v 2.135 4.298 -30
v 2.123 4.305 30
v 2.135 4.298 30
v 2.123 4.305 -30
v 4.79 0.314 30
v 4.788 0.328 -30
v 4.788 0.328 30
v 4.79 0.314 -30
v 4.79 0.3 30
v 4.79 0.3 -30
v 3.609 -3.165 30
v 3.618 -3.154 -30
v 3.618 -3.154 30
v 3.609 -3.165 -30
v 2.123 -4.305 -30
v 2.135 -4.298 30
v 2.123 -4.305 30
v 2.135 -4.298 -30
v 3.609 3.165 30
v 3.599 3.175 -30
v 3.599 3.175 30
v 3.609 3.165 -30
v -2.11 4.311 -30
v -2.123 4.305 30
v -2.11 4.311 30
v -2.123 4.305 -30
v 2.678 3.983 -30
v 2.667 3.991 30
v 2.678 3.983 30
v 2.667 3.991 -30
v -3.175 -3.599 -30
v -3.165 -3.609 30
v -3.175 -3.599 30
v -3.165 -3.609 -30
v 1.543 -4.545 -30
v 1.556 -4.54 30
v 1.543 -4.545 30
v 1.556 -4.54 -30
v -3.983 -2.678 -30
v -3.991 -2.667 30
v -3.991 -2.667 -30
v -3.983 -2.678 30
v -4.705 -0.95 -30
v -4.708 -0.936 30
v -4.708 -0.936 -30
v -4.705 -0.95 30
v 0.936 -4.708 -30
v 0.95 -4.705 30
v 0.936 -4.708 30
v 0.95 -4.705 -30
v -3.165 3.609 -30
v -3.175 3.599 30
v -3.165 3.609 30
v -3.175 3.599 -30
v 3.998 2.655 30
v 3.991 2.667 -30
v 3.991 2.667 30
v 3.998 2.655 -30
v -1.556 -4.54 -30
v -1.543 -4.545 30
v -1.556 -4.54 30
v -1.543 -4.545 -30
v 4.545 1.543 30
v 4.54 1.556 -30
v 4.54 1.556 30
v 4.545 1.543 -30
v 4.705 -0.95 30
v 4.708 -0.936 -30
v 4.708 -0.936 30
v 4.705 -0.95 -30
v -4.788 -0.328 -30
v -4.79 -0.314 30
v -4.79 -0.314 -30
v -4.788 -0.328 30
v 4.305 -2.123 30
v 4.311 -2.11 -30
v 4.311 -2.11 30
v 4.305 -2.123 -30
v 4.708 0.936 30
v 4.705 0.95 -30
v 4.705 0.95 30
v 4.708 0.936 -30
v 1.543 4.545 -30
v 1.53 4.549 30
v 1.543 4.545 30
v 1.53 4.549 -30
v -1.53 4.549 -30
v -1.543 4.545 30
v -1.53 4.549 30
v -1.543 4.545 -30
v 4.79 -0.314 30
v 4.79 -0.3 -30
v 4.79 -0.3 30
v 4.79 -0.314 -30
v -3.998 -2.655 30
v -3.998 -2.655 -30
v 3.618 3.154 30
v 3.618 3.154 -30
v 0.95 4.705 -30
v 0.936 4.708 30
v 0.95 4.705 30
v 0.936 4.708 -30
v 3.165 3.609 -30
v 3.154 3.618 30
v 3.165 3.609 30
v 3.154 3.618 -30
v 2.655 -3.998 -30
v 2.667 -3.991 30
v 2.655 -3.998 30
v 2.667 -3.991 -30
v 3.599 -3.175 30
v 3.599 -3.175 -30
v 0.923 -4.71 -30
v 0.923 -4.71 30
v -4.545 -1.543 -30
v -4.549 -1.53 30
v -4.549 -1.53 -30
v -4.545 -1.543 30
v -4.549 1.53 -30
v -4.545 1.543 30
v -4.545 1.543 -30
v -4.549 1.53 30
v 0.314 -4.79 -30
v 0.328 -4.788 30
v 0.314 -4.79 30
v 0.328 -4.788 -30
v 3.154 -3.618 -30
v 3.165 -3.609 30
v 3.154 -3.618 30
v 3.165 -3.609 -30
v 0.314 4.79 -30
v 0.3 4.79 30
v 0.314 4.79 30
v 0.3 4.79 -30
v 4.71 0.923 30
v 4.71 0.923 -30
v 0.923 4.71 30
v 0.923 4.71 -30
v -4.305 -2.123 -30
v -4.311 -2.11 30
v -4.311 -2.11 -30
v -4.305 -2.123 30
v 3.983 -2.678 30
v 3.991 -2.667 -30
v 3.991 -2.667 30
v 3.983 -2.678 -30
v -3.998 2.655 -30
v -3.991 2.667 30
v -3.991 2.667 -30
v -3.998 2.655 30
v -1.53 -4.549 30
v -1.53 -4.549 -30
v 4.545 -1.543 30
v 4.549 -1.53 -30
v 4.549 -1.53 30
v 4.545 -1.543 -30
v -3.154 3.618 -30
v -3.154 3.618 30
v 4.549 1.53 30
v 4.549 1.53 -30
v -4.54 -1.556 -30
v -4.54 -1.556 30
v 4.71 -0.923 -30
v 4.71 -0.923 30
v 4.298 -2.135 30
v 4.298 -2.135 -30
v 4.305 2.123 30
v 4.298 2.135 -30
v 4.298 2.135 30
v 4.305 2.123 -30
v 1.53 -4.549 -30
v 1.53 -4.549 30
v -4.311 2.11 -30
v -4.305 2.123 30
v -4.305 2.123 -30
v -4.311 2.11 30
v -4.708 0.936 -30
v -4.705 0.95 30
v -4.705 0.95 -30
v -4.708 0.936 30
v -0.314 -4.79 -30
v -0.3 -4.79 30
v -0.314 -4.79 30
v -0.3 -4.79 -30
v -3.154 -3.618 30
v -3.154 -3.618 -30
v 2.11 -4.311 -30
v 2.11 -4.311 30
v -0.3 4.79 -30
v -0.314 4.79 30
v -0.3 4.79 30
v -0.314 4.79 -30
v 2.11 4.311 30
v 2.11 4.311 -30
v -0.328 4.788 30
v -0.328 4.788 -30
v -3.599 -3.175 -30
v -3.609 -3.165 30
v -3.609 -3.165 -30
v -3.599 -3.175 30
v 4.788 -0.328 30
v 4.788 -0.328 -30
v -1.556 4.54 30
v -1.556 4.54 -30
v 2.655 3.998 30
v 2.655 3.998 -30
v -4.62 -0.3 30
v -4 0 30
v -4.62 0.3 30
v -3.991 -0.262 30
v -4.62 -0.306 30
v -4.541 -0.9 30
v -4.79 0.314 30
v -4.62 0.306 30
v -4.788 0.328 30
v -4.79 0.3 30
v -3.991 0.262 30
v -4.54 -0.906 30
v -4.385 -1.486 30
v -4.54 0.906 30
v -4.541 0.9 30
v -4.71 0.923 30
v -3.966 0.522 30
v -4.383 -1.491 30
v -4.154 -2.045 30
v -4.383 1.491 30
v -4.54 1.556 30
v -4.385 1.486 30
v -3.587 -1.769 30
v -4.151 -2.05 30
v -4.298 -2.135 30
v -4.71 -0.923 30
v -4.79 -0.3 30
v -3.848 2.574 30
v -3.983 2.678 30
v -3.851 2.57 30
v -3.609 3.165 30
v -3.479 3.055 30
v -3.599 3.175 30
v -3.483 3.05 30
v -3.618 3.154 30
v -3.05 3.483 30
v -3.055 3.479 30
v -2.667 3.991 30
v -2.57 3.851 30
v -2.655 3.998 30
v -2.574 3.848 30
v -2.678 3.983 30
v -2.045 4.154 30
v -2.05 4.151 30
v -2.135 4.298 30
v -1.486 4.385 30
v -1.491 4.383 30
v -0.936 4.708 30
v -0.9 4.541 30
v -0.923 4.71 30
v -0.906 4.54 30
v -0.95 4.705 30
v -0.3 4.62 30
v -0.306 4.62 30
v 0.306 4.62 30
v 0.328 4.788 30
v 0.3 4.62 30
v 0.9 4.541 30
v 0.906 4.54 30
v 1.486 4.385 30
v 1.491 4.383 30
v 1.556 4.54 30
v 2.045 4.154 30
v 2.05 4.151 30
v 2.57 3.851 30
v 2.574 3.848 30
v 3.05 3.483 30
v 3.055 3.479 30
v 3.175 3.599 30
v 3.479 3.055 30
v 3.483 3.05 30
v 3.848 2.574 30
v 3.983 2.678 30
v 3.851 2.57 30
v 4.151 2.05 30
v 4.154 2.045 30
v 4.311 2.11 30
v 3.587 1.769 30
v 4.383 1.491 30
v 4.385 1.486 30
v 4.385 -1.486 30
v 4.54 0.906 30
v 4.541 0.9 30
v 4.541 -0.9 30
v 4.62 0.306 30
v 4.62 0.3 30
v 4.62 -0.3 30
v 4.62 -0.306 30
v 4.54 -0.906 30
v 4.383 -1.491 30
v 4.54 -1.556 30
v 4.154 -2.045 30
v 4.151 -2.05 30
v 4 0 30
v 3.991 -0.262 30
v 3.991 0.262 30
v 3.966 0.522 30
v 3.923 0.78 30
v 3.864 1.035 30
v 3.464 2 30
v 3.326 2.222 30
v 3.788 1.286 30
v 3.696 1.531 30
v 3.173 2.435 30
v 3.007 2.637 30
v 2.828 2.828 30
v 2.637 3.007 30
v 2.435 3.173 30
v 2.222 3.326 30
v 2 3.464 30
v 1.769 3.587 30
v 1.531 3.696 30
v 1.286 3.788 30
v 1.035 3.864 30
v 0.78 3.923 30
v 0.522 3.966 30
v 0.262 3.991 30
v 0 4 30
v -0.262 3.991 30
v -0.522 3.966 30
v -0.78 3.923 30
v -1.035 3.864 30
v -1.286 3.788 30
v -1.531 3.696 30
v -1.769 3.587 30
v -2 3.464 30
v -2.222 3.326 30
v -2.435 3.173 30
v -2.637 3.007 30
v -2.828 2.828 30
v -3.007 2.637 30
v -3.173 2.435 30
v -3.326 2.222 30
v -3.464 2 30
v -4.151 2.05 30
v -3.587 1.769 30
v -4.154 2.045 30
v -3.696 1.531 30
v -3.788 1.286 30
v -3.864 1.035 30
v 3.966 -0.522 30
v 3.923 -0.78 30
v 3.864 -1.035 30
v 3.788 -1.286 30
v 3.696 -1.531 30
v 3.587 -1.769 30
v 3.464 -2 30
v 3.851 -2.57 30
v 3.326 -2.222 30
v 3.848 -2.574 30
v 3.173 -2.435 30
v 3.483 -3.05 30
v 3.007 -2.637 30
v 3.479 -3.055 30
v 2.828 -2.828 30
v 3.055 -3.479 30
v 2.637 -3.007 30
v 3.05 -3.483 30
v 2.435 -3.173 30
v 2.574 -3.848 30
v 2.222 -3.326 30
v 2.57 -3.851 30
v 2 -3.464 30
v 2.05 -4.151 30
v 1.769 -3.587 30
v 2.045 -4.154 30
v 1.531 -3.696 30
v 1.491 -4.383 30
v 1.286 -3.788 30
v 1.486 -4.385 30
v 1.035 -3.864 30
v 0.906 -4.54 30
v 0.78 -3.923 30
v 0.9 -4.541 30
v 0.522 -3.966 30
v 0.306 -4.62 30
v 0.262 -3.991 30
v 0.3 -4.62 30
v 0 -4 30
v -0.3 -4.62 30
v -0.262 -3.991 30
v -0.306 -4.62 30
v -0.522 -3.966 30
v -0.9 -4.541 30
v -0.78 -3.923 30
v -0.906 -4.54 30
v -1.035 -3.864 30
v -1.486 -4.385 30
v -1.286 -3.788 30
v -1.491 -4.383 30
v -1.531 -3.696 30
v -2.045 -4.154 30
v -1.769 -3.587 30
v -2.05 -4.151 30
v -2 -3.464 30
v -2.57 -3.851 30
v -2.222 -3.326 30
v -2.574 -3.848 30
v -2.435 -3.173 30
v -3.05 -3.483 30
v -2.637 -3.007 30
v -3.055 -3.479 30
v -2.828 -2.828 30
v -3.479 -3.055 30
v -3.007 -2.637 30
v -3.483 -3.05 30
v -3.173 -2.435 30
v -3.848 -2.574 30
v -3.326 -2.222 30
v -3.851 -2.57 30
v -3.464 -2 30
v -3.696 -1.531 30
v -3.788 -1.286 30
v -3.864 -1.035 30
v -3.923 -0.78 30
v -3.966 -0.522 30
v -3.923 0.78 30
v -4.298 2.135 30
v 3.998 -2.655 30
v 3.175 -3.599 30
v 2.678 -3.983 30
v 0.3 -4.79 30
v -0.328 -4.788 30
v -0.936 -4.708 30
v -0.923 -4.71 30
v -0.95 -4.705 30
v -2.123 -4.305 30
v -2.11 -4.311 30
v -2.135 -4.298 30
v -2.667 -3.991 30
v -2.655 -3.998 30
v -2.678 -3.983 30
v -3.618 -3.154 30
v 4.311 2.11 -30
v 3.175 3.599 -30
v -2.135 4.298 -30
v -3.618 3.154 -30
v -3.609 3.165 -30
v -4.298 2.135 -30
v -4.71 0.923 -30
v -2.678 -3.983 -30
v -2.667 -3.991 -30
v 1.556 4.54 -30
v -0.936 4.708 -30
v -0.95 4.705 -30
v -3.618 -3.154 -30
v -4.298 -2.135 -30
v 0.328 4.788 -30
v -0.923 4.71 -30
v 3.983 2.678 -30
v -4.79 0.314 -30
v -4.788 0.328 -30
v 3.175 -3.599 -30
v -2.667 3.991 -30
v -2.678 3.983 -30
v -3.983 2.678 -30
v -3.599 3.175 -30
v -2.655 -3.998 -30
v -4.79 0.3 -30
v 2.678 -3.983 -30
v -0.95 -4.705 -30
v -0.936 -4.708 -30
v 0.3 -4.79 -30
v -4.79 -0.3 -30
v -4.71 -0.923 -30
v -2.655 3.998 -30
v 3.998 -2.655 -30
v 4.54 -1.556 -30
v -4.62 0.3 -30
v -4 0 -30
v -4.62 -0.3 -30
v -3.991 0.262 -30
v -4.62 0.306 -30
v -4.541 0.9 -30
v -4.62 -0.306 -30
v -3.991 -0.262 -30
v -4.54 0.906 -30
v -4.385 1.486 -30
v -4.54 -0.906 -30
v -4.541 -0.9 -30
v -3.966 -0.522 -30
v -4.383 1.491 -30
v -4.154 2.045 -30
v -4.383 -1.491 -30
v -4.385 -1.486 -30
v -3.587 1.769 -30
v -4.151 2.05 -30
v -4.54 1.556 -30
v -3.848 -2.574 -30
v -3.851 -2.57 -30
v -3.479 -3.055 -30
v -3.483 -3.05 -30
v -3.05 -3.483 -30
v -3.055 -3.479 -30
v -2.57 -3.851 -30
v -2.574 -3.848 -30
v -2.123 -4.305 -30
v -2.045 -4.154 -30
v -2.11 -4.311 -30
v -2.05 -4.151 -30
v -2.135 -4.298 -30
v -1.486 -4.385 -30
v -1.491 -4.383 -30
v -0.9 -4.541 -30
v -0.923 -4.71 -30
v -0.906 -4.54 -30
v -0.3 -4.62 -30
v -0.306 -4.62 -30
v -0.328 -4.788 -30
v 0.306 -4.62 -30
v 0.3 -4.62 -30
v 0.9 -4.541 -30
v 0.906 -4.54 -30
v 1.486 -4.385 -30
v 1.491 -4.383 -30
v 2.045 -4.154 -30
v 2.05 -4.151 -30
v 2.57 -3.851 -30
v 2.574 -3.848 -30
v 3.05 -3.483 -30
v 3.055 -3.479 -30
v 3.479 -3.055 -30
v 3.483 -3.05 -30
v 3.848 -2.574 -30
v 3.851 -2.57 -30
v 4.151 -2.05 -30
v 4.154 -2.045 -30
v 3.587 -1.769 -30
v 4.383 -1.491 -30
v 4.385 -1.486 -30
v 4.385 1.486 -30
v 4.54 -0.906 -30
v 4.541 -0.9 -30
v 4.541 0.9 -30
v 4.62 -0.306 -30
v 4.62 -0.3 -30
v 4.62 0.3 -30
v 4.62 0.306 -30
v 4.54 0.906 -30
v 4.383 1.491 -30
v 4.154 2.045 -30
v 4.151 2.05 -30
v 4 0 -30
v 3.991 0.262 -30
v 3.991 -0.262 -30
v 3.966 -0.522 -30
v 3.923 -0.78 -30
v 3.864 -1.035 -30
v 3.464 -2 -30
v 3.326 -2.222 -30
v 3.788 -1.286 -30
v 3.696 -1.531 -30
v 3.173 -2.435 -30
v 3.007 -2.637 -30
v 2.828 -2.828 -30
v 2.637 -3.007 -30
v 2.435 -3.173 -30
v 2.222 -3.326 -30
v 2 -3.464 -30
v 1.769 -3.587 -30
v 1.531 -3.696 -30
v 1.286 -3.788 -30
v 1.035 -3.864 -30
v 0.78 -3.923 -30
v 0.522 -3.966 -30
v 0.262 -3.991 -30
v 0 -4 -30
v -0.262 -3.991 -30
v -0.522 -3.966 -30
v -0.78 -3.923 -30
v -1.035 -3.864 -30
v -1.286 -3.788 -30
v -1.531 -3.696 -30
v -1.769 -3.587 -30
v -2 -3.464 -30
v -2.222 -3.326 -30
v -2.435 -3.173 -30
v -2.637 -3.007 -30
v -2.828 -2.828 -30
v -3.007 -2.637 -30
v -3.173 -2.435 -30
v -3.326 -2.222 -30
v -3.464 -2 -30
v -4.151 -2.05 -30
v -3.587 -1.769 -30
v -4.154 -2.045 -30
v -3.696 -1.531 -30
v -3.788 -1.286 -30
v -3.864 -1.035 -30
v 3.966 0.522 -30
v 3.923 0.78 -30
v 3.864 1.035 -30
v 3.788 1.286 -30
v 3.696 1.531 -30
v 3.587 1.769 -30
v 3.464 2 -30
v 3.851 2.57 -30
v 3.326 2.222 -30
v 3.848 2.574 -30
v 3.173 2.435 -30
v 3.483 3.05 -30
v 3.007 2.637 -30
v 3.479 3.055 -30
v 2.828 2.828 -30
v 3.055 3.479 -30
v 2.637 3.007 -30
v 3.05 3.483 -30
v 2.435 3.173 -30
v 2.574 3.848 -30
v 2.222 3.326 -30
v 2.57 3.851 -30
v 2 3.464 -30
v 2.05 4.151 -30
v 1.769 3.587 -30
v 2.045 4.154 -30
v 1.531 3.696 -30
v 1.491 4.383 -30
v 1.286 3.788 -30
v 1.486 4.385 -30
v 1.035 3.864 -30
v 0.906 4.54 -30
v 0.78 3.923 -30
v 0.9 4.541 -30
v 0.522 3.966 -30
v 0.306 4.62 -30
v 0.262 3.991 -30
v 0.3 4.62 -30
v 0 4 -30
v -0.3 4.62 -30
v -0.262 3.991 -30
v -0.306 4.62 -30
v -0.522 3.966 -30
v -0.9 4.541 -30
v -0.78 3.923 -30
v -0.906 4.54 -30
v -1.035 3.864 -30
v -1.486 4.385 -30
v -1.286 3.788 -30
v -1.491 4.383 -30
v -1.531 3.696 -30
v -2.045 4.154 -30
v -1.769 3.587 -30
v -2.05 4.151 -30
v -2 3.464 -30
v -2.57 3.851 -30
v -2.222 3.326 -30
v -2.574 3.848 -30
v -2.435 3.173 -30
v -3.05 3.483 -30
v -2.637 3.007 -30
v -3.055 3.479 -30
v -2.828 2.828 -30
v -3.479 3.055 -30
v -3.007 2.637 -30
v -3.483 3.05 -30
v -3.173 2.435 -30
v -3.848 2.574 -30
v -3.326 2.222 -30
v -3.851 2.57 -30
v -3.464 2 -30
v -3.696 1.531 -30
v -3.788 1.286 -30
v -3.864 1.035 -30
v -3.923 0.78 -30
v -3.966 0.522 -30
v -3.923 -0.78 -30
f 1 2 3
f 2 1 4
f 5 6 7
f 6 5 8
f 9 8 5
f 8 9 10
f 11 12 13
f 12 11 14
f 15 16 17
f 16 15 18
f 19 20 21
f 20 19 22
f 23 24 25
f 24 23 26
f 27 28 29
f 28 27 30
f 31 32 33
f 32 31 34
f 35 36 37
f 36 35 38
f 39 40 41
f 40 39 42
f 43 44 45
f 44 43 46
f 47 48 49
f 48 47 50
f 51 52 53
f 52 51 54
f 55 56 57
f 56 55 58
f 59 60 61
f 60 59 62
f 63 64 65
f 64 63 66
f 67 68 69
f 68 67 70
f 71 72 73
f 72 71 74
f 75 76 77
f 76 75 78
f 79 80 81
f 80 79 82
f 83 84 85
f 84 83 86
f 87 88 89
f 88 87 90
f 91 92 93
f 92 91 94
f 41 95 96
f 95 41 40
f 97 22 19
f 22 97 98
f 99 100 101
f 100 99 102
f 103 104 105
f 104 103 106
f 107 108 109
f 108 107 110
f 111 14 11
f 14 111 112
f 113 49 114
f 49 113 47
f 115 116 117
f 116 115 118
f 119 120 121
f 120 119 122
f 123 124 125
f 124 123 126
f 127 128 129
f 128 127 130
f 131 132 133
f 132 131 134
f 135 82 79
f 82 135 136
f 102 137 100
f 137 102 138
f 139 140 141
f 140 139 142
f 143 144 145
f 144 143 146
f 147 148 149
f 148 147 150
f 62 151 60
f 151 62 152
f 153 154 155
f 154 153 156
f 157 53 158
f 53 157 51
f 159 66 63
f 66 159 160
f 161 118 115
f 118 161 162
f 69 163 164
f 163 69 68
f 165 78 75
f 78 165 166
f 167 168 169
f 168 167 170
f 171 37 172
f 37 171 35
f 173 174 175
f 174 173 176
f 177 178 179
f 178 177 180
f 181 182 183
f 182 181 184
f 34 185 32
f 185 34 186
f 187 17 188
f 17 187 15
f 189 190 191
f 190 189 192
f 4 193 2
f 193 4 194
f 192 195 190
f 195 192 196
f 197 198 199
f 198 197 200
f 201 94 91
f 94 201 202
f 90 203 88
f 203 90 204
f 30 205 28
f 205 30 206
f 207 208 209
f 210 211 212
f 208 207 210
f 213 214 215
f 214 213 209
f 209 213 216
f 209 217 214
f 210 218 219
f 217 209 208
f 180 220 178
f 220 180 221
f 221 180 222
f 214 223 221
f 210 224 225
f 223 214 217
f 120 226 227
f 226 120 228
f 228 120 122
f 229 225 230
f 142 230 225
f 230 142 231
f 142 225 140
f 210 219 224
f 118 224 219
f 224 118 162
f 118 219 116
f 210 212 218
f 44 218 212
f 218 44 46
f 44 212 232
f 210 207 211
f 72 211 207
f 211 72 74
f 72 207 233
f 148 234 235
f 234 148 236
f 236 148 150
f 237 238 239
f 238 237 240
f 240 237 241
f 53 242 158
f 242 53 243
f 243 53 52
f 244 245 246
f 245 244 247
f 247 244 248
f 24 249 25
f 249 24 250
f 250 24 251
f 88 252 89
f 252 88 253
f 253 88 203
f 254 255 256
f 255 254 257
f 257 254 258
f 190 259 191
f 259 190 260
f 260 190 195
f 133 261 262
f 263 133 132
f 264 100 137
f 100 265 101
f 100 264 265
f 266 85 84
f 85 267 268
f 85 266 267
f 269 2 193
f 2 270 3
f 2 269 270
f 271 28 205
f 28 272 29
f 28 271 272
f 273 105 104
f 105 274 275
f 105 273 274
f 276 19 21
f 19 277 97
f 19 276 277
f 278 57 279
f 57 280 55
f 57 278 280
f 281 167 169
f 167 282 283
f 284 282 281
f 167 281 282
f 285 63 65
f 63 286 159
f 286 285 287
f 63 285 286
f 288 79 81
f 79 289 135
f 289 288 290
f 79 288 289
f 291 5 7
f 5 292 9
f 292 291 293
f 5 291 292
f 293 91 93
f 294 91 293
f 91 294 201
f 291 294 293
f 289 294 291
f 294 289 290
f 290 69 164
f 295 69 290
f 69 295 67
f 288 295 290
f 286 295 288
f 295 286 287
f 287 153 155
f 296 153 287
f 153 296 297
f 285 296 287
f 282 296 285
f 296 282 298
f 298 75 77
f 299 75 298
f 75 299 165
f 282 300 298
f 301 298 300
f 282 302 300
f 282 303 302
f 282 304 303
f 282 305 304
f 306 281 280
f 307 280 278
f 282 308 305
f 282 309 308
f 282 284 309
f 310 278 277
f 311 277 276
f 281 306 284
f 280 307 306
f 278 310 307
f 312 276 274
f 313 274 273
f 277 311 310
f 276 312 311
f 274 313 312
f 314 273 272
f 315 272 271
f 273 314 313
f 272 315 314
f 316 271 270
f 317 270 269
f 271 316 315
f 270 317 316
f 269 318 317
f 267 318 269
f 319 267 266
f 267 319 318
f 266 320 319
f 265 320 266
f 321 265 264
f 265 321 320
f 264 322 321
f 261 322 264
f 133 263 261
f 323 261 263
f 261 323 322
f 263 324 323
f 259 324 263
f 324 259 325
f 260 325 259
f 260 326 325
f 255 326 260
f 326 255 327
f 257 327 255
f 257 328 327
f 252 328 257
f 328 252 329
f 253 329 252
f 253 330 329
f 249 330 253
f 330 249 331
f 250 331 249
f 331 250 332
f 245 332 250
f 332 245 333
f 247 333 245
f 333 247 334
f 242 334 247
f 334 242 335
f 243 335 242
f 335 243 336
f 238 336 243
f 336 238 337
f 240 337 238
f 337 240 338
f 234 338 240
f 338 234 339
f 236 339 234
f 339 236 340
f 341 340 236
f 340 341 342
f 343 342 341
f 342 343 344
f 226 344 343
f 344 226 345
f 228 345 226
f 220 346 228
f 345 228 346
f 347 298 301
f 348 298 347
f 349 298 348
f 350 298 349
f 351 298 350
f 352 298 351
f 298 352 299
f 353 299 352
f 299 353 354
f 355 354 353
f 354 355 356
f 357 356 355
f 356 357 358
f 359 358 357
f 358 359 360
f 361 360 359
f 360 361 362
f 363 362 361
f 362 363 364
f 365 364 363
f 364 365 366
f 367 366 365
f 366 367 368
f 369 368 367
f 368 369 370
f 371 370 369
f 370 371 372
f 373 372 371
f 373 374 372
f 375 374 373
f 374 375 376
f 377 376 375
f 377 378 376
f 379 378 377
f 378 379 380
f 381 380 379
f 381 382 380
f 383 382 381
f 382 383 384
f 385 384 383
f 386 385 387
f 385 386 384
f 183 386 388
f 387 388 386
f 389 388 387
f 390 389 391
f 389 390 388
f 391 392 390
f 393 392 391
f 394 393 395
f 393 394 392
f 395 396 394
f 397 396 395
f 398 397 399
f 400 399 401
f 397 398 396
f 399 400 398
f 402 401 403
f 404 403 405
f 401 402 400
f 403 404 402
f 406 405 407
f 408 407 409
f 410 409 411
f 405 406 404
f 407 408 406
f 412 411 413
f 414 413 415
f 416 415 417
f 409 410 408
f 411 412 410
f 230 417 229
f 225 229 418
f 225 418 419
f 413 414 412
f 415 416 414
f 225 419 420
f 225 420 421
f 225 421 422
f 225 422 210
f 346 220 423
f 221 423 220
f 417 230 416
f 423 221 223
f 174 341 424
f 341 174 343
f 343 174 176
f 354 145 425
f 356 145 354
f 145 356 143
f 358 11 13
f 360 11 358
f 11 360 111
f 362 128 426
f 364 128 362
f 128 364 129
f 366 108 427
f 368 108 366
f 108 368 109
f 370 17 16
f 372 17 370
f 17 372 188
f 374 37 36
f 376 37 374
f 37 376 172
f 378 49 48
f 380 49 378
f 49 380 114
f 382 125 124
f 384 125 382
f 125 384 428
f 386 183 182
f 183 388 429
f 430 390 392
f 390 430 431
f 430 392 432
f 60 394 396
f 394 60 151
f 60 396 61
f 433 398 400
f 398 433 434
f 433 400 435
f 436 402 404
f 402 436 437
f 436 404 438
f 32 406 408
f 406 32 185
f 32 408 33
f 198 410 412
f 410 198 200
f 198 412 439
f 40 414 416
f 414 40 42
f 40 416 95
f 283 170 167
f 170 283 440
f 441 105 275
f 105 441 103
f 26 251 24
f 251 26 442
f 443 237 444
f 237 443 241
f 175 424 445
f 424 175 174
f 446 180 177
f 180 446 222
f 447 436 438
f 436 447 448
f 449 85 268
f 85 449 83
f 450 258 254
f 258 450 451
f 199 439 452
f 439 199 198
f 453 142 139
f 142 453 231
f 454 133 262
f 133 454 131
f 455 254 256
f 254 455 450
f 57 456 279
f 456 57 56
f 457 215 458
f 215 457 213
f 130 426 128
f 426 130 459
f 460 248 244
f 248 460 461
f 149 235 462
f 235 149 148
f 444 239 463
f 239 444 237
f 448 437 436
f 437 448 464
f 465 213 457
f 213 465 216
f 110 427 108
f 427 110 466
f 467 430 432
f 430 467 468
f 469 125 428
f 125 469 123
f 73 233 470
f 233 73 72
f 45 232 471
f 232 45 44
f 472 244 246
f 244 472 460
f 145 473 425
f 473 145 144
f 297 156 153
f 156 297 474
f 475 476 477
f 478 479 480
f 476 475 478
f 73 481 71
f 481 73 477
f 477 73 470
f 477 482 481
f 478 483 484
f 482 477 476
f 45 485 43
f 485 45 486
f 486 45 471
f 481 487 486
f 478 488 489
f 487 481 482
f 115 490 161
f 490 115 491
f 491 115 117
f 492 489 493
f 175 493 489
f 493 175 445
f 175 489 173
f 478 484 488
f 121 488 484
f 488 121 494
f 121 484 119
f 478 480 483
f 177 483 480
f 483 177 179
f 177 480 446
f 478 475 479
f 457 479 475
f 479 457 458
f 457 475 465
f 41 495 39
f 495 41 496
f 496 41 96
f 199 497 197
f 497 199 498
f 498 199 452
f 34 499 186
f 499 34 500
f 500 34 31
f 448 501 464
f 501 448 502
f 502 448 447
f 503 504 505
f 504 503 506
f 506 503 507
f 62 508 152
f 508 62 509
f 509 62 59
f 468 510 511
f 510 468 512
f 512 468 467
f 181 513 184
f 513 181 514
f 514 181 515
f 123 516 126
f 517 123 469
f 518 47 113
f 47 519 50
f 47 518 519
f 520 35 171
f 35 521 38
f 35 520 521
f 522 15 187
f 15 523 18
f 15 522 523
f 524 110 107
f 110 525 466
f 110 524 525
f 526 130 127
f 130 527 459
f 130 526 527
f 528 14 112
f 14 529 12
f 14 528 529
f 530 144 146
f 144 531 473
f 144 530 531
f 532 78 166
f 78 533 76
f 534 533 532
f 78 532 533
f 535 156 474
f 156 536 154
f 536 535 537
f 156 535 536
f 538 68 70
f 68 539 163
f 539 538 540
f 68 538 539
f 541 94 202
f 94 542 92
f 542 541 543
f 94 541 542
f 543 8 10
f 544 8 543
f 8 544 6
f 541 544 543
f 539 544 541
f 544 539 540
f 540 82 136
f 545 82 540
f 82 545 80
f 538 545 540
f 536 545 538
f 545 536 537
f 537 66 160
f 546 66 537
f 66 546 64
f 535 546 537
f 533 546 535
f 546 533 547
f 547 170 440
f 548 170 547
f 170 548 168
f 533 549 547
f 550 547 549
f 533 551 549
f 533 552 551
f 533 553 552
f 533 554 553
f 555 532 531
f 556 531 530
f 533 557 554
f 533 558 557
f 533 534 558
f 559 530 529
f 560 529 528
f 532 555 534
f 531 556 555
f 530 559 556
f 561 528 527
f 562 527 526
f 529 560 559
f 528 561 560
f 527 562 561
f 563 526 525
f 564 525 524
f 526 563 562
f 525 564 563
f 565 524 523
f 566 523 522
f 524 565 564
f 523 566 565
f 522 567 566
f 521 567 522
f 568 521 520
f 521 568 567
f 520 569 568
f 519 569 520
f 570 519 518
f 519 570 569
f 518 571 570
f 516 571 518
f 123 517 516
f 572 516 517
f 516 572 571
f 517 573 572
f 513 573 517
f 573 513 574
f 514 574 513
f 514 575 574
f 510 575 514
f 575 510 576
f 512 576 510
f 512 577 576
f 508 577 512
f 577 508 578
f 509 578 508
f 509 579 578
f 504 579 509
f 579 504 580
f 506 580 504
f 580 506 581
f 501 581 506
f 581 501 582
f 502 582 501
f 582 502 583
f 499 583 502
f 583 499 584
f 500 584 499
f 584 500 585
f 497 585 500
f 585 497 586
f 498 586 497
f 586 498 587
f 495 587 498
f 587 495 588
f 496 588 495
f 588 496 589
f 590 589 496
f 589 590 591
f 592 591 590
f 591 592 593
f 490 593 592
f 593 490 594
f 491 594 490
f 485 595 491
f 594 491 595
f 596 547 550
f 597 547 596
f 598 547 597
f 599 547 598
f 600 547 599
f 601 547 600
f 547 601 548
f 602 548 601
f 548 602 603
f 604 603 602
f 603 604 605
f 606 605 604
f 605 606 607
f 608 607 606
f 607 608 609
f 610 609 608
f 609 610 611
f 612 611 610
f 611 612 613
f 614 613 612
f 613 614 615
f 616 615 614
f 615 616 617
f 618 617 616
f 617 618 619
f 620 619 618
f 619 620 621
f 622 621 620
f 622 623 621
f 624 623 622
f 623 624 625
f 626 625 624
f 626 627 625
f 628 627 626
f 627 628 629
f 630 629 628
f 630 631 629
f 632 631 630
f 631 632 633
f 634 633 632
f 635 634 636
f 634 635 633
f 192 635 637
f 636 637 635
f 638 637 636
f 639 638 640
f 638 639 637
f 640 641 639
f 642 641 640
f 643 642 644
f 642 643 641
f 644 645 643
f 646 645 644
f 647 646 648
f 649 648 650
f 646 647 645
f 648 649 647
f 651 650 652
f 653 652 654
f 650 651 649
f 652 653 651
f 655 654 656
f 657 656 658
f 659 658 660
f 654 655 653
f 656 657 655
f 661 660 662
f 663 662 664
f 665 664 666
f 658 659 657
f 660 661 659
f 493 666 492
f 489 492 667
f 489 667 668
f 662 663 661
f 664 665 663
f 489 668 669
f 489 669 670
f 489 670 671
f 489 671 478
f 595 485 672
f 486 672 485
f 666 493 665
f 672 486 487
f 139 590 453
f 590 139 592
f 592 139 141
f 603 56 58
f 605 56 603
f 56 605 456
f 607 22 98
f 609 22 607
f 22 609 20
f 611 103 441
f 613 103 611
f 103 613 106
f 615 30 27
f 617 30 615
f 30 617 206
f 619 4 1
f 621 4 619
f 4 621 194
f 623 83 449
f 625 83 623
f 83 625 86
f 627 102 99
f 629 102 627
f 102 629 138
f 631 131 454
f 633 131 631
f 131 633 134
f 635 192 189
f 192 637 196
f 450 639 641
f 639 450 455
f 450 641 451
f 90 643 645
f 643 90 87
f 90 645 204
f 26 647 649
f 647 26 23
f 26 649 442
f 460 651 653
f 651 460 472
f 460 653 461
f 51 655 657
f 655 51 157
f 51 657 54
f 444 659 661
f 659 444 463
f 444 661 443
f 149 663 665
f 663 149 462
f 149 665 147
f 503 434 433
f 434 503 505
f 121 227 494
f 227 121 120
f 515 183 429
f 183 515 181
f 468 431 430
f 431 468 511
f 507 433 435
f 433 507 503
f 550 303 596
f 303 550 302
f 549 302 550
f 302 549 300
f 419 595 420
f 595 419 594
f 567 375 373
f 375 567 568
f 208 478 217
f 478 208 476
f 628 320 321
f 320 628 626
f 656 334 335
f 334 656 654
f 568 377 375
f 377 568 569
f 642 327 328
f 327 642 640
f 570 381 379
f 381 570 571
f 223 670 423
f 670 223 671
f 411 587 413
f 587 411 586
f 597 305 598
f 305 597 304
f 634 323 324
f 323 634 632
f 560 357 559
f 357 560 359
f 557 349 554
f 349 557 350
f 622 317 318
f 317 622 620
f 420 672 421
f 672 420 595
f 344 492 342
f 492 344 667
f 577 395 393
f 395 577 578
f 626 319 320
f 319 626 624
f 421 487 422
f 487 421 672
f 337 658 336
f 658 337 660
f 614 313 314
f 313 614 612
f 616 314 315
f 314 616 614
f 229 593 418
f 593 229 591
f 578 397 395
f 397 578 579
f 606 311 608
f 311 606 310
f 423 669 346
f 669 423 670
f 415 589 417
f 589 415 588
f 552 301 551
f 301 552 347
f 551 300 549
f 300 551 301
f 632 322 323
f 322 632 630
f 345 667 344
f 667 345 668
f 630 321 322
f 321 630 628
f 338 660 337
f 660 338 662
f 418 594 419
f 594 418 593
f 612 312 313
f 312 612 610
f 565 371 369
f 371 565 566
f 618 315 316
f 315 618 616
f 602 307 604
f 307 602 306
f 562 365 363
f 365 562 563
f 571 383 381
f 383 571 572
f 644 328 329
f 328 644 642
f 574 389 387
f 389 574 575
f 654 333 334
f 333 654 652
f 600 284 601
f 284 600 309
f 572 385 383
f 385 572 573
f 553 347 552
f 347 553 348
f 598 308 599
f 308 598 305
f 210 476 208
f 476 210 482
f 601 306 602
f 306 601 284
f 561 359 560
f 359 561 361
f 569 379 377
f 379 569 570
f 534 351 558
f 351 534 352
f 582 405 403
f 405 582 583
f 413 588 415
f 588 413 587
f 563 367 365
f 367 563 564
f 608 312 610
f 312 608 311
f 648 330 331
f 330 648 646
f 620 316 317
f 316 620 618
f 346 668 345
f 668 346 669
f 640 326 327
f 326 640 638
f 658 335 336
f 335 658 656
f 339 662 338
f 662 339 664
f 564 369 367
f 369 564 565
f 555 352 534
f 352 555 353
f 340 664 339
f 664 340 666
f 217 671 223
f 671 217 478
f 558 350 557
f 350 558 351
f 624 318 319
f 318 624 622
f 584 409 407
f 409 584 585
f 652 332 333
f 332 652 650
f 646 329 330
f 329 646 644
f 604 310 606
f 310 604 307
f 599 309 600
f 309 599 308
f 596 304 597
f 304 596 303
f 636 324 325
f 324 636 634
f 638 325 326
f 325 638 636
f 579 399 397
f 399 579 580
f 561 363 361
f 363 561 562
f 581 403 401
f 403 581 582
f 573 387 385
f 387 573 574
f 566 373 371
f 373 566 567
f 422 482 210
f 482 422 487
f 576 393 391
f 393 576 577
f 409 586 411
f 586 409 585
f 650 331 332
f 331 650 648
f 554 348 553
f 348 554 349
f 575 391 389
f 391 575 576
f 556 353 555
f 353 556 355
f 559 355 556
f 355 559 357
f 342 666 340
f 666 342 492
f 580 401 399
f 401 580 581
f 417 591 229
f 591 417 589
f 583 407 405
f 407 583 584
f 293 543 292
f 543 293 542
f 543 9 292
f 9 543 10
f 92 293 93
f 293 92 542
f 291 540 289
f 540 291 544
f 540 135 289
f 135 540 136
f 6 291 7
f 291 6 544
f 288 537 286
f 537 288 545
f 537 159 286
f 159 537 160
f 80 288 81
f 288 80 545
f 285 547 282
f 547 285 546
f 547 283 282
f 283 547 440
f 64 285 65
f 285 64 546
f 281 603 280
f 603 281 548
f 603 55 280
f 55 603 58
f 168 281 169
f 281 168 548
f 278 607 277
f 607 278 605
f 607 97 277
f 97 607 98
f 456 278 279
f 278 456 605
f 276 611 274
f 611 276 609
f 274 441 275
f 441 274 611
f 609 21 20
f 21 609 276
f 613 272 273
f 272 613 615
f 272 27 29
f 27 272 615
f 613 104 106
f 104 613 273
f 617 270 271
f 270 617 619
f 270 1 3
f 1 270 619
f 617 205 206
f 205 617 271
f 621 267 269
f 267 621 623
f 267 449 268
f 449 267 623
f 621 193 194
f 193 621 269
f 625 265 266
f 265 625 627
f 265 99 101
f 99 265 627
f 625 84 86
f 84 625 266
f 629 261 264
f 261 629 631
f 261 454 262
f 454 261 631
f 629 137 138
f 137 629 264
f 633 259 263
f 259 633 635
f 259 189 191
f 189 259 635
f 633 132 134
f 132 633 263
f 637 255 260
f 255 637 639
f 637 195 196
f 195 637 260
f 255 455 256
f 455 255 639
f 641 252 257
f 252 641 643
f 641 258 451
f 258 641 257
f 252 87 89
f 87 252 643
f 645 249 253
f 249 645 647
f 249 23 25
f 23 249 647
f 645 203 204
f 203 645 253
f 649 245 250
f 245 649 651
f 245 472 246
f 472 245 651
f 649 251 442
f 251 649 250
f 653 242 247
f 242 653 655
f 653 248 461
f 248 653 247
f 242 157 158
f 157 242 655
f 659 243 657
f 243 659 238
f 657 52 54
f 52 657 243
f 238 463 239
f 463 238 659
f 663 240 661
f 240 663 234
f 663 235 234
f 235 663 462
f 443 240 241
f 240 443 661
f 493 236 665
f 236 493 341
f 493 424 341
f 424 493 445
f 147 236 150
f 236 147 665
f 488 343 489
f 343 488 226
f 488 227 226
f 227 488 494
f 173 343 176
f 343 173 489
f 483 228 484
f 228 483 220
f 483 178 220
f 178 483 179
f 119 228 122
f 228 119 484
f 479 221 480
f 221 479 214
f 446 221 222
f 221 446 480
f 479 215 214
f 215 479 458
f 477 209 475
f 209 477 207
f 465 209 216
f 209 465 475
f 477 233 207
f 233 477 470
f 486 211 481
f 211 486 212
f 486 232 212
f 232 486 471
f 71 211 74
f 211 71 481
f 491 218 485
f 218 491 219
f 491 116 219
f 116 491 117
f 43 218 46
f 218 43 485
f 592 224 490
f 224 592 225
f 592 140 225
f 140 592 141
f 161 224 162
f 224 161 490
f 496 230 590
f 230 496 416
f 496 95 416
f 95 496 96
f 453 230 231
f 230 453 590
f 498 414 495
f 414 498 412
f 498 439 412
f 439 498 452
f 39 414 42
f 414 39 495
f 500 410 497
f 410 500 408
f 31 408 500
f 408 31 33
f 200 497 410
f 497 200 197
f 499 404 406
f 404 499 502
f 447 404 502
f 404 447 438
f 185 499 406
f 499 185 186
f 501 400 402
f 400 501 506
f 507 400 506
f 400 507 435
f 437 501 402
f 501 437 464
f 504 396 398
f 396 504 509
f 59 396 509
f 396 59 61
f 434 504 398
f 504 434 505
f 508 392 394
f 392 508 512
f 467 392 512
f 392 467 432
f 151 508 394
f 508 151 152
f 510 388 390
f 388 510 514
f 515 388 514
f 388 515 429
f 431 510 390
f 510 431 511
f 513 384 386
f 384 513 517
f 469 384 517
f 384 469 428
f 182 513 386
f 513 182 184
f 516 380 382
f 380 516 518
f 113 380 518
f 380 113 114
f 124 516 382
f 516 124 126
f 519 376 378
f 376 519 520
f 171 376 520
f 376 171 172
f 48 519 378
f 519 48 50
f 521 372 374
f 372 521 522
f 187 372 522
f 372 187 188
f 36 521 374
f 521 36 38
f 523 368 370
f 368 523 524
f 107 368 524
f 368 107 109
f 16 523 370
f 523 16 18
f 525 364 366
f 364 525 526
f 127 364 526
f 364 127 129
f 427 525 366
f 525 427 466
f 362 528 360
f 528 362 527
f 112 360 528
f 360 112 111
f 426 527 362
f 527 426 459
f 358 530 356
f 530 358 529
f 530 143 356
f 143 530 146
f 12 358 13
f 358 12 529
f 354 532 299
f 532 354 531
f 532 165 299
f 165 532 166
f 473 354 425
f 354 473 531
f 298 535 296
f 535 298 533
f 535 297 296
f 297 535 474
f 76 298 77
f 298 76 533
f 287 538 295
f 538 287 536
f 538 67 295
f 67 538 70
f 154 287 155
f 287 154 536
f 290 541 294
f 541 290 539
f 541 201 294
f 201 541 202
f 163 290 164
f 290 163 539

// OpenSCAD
$fn=96;

module heatshrink_sleeve(length=50, id=6, wall=0.6) {
    od = id + 2*wall;
    difference() {
        cylinder(h=length, d=od, center=true);
        cylinder(h=length+0.2, d=id, center=true);
    }
}

module heatshrink_sleeve_textured(length=50, id=6, wall=0.6, ribs=36, rib_depth=0.15) {
    od = id + 2*wall;
    difference() {
        union() {
            difference() {
                cylinder(h=length, d=od, center=true);
                cylinder(h=length+0.2, d=id, center=true);
            }
        }
        for (i = [0:ribs-1]) {
            rotate([0,0, i*360/ribs])
                translate([od/2 - rib_depth/2, 0, 0])
                    cube([rib_depth, 0.6, length+0.4], center=true);
        }
    }
}

heatshrink_sleeve_textured(length=60, id=8, wall=0.8, ribs=48, rib_depth=0.18);
